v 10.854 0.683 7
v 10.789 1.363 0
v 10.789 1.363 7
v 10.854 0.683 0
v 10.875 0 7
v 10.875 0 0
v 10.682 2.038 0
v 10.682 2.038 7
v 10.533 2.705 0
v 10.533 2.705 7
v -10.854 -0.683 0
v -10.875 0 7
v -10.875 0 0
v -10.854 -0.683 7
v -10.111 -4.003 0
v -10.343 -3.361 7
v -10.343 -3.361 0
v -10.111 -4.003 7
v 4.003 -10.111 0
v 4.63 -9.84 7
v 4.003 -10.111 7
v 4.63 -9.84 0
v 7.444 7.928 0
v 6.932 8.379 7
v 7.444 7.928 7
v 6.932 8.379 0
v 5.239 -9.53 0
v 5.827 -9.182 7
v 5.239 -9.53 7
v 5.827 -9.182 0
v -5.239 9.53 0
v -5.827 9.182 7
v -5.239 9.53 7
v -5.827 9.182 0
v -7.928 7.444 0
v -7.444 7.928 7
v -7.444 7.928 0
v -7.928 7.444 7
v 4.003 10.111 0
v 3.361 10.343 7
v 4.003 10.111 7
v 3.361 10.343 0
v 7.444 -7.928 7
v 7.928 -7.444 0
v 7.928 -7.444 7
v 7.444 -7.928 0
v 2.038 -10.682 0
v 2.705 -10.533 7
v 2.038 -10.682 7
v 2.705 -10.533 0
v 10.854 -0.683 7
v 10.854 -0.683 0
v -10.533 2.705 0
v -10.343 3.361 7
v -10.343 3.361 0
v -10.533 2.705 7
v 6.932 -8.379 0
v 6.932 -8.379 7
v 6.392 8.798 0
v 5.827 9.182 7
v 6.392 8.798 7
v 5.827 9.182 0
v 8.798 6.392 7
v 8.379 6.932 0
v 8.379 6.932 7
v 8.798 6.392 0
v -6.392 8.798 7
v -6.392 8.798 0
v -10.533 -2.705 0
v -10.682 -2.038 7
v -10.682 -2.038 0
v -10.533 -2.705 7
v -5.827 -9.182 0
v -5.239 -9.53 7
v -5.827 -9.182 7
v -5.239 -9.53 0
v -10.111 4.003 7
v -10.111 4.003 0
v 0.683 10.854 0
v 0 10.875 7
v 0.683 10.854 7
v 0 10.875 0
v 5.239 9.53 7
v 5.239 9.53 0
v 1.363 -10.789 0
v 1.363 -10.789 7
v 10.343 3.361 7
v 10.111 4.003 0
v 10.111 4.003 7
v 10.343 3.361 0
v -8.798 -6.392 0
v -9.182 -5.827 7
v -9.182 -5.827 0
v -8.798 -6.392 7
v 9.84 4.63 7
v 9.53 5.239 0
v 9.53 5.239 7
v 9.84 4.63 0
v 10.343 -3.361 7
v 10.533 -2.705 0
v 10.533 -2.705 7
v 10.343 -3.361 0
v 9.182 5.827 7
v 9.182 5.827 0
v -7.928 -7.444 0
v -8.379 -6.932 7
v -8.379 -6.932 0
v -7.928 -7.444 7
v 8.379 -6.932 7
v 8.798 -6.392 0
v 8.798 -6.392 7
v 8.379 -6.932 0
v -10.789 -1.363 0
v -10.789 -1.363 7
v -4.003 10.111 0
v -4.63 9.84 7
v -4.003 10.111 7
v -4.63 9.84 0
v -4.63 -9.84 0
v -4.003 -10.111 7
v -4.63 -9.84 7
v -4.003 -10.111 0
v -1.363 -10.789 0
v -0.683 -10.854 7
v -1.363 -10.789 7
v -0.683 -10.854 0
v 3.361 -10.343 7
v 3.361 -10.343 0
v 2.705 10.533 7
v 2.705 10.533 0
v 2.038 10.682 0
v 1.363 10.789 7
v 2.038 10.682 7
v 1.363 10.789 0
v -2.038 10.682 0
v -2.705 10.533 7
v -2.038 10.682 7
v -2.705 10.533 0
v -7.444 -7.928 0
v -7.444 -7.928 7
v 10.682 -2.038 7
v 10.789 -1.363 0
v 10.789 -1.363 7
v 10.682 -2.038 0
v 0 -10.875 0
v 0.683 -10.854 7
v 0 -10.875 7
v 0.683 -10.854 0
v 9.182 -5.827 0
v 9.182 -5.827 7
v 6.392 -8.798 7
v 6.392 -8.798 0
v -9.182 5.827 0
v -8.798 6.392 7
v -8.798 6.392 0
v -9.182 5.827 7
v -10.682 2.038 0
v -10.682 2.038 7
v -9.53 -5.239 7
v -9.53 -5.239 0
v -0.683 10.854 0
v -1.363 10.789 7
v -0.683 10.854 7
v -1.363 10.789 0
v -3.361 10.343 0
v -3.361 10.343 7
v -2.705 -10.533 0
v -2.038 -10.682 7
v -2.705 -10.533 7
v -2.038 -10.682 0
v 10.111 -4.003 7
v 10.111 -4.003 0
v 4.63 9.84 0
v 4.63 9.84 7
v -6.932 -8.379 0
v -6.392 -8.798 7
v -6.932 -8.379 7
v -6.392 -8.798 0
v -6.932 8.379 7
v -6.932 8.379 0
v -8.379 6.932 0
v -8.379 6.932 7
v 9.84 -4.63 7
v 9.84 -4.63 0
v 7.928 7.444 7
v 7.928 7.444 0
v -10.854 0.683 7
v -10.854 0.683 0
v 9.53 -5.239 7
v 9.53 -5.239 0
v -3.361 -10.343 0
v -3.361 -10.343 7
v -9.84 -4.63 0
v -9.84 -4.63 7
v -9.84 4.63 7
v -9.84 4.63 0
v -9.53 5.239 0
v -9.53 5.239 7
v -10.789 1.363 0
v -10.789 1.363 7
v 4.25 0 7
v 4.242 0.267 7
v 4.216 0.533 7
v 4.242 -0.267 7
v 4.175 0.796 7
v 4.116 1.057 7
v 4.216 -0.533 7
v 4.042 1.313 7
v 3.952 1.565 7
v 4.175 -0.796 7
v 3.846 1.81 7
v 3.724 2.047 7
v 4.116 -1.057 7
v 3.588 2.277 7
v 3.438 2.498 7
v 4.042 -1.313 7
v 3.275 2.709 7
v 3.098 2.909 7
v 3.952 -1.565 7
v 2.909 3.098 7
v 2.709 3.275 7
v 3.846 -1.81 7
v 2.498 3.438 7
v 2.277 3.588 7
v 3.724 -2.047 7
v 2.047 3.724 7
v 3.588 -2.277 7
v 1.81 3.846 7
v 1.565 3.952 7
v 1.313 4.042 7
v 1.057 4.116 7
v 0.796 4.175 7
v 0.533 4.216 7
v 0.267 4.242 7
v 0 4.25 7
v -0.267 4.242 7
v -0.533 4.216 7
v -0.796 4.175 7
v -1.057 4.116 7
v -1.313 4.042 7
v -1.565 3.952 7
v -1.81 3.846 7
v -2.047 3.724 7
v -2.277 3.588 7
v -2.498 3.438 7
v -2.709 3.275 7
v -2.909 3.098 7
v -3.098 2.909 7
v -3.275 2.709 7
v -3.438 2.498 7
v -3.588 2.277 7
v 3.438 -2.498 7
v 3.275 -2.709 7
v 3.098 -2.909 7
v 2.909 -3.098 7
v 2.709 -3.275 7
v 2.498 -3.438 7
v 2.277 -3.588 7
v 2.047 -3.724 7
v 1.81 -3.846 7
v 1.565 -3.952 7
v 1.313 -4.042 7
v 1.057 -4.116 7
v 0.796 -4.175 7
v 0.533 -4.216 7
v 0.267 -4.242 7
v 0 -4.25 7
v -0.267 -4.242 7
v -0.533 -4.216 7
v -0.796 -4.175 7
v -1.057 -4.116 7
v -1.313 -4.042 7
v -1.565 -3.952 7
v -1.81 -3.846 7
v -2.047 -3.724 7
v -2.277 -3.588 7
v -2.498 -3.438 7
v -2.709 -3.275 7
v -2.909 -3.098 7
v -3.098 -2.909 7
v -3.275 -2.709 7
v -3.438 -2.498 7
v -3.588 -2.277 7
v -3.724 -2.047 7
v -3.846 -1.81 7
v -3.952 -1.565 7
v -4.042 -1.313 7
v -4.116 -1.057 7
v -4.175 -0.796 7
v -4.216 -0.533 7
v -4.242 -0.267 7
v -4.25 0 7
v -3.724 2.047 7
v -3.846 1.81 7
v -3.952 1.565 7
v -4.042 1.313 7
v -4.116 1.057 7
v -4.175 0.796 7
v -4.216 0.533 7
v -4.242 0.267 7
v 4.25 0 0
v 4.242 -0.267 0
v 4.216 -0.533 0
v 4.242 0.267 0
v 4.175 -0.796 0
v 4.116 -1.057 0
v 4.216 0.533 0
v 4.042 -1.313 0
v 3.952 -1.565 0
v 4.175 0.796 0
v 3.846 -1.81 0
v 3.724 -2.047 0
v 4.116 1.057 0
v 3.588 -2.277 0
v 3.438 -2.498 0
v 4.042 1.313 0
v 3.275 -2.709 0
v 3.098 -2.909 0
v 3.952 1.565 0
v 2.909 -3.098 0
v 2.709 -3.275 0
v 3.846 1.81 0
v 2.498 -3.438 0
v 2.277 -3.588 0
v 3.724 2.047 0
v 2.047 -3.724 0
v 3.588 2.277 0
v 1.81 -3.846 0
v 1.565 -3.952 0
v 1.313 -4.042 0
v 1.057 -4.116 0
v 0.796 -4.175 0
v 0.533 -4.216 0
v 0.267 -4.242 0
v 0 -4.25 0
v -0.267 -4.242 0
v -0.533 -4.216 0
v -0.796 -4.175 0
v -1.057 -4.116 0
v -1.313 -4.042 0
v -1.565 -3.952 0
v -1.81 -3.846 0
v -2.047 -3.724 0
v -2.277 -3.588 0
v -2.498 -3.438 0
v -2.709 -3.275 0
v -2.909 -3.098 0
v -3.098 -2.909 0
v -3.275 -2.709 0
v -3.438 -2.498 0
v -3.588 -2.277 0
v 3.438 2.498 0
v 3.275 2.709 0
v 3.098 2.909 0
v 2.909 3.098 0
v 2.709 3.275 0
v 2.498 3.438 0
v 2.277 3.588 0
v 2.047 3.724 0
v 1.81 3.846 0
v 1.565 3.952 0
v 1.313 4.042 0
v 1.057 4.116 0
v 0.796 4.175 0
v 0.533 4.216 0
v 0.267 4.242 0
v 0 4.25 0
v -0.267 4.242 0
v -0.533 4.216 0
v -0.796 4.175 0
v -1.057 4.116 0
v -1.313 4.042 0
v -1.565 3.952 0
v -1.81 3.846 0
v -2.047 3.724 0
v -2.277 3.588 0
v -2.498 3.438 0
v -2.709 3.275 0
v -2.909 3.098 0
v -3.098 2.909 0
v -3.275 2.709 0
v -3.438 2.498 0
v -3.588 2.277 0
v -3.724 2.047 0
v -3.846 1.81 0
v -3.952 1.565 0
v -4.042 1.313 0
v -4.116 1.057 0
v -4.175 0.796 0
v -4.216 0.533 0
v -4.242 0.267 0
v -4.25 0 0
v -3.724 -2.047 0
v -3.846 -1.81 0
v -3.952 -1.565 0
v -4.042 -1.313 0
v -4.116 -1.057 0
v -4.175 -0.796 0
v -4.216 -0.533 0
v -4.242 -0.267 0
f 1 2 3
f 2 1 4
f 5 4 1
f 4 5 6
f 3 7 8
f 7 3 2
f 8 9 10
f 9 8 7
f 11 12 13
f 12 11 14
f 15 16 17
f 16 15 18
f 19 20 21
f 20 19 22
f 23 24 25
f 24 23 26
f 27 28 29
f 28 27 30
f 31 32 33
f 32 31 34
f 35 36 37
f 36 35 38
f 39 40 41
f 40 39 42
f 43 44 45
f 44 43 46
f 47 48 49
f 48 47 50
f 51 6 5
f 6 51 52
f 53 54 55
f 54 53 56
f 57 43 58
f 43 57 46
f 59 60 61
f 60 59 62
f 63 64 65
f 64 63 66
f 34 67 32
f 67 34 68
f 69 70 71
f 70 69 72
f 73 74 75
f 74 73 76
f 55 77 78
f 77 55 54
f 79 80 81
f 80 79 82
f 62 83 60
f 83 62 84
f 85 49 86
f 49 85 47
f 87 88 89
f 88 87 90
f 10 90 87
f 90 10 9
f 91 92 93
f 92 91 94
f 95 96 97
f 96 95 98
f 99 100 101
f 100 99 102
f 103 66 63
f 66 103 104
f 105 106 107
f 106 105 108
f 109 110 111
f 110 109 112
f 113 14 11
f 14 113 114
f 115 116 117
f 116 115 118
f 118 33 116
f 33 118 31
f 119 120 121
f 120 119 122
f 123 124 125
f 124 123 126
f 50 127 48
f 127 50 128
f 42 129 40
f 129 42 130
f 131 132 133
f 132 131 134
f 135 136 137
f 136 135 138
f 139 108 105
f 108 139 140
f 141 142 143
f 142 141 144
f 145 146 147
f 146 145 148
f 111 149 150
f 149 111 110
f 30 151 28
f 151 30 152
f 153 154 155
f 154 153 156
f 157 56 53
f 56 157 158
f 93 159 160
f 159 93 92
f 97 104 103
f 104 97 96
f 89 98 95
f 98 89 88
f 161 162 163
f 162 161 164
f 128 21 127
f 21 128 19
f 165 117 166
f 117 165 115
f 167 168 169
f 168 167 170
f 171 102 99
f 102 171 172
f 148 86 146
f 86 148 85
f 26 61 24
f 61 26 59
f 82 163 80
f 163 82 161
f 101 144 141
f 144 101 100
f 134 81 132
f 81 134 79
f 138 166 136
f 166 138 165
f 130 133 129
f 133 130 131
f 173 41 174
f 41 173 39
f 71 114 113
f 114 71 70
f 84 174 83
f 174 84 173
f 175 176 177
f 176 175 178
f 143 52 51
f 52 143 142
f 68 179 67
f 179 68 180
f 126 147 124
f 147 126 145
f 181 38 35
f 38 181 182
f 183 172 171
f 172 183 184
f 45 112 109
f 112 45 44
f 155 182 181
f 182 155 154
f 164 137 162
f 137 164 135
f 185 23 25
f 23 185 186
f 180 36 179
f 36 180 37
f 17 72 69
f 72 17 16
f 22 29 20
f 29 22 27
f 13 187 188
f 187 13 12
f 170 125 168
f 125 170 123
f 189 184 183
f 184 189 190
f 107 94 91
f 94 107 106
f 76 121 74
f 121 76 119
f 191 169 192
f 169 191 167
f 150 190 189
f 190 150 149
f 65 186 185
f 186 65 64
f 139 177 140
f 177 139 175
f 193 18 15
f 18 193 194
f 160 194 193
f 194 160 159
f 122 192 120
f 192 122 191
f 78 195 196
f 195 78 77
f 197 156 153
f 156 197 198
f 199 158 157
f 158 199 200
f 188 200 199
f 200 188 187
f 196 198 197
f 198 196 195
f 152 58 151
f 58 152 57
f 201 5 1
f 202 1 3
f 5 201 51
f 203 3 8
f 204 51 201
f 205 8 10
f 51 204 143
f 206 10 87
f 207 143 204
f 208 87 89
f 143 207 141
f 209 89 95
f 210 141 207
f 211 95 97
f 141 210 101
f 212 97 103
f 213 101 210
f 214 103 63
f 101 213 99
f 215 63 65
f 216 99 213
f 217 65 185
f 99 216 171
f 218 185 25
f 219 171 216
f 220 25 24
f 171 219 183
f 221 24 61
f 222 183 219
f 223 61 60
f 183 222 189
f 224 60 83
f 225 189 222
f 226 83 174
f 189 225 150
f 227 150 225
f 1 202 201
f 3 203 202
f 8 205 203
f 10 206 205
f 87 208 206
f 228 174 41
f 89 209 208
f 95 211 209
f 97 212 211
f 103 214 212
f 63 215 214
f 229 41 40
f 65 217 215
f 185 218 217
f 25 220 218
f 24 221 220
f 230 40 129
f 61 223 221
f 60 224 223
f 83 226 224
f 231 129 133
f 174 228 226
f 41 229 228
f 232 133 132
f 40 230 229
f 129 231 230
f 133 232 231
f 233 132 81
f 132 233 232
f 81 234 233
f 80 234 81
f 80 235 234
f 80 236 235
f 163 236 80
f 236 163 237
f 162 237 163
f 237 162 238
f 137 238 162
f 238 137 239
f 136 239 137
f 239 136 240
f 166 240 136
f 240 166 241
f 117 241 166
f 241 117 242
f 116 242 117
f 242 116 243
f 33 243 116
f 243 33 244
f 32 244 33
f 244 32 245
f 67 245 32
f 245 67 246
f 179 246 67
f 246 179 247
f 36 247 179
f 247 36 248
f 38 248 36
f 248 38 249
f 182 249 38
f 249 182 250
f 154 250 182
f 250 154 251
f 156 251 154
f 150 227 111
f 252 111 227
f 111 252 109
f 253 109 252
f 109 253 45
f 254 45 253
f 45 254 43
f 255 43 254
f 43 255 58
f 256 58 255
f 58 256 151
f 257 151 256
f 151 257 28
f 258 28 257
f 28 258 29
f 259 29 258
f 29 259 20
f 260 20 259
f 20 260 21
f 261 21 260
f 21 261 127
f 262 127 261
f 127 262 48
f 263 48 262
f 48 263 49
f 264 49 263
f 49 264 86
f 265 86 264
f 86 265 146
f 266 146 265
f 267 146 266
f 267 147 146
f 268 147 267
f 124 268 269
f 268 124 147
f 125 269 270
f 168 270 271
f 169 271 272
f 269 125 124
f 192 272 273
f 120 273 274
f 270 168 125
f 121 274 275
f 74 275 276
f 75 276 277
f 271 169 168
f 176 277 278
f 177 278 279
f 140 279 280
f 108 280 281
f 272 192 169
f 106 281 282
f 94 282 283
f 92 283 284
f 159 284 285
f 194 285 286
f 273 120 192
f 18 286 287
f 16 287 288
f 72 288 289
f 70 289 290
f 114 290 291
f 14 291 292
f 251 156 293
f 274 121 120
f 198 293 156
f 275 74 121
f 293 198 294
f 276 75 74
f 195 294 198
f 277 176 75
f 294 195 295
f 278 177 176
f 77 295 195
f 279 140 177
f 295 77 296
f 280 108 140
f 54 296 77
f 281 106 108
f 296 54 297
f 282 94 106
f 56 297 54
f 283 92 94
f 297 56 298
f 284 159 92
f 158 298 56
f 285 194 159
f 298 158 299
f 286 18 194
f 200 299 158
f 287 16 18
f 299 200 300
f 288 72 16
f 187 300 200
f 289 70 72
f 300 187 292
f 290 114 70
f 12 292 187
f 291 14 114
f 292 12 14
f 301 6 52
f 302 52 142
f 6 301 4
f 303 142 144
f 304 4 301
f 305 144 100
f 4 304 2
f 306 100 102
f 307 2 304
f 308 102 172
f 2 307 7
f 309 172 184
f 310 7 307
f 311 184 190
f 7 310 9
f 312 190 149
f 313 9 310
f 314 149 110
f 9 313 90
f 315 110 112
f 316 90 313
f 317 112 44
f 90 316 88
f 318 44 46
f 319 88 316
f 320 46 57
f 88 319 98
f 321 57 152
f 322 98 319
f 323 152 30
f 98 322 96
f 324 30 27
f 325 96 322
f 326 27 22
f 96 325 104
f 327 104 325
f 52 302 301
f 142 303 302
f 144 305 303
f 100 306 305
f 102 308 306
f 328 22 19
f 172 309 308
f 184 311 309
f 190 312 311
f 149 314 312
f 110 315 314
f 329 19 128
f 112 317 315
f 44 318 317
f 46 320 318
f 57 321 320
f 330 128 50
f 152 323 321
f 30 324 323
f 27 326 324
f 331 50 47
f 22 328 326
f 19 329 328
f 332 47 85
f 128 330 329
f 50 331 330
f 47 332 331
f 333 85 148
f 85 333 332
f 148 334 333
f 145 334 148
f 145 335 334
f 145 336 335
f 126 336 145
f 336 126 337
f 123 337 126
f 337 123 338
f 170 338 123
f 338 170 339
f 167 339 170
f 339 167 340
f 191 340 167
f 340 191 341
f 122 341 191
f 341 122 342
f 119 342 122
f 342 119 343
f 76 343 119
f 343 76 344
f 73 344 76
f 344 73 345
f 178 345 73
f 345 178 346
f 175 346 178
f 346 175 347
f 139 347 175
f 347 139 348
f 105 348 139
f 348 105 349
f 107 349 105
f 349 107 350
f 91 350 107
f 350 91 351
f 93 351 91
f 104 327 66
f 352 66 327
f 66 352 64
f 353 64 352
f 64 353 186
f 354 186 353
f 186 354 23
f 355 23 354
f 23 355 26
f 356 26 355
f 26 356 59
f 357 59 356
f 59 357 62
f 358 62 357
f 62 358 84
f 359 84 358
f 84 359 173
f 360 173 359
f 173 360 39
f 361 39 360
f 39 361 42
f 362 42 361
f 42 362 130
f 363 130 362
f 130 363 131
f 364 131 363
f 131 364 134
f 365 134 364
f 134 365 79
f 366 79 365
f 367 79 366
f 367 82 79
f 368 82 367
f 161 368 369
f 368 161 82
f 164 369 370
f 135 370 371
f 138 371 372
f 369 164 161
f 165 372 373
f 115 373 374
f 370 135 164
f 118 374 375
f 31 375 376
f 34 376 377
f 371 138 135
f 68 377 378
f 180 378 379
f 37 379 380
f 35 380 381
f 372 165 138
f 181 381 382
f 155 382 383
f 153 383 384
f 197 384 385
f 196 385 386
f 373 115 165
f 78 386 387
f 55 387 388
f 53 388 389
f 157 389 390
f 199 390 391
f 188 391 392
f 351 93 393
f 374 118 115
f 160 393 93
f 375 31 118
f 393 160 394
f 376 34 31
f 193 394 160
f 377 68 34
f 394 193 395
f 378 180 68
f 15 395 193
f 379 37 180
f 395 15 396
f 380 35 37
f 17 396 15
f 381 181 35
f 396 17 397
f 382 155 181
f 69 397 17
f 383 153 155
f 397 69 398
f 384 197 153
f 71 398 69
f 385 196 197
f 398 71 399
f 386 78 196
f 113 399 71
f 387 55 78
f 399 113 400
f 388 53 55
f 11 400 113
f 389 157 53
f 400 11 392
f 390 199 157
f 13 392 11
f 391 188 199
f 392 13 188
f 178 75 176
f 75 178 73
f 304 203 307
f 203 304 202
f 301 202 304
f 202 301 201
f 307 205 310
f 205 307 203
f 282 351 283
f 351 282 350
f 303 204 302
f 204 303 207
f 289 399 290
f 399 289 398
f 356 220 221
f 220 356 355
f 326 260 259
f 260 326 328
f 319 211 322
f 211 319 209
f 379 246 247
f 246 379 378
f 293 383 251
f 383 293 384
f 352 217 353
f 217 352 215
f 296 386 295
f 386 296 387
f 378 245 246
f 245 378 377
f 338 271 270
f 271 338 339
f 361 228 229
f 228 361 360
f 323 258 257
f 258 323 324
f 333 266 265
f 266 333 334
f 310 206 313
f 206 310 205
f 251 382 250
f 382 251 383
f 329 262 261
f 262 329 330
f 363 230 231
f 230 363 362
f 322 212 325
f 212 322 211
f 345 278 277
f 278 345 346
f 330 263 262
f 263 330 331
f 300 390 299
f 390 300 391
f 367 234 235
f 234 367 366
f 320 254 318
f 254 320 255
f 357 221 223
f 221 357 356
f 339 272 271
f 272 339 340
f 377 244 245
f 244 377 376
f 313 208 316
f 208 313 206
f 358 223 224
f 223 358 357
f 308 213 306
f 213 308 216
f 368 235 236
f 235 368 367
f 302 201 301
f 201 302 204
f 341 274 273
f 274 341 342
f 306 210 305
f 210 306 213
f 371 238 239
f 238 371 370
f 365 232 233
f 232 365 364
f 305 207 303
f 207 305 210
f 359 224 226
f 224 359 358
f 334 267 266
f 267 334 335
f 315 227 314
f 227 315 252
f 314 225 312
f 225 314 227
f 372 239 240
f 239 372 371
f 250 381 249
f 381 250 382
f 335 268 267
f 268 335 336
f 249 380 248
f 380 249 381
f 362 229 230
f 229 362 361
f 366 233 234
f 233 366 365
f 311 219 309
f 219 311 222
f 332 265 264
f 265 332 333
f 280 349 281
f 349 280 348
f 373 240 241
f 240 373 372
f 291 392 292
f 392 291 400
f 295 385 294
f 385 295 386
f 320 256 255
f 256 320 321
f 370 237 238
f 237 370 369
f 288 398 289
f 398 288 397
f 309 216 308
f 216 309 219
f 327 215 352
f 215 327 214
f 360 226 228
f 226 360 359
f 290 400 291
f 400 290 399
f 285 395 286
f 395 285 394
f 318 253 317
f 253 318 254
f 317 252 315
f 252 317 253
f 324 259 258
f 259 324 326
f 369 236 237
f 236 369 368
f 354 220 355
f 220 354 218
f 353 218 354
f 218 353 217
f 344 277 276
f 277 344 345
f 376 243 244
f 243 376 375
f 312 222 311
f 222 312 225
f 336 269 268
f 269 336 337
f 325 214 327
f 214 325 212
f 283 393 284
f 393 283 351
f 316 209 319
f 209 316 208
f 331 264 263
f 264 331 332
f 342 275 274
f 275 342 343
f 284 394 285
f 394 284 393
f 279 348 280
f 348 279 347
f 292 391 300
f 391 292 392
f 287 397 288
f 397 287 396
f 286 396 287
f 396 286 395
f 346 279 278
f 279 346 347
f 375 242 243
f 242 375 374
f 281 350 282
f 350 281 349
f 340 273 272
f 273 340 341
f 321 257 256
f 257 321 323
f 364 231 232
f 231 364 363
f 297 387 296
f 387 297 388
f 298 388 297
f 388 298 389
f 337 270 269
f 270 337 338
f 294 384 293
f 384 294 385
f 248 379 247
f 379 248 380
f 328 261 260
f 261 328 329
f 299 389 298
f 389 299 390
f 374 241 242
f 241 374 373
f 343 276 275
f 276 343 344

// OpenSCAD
// Bearing Customiser (http://www.thingiverse.com/thing:313437)
// *********************************************************************************
// Version history:
// Author:			Date: 			Description:
// Whitecoat		2014-04-28		Initial build
// 
// *********************************************************************************
// customiser script

// Bearing Part Number
PartNo = 608;  // [ 603,  604, 605,606, 607, 608, 609, 623, 624, 625, 626, 627, 628, 629, 633, 634, 635, 636, 637, 638, 639, 673, 674, 675, 676, 677,  678,  683,  684,  685,  686,  687,  688,  689,  693,  694,  695,  696,  697,  698,  699,  6000, 6001, 6002, 6003, 6004, 6005, 6006, 6007, 6008, 6009, 6010, 6011, 6012, 6013, 6014, 6015, 6016, 6017, 6018, 6019, 6020, 6021, 6022, 6024, 6026, 6028, 6030, 6200, 6201, 6202, 6203, 6204, 6205, 6206, 6207, 6208, 6209, 6210, 6211, 6212, 6213, 6214, 6215, 6216, 6217, 6218, 6219, 6220, 6221, 6222, 6224, 6226, 6228, 6230, 6300, 6301, 6302, 6303, 6304, 6305, 6306, 6307, 6308, 6309, 6310, 6311, 6312, 6313, 6314, 6315, 6316, 6317, 6318, 6319, 6320, 6321, 6322, 6324, 6326, 6328, 6330, 6701, 6702, 6703, 6704, 6705, 6706, 6707, 6800, 6801, 6802, 6803, 6804, 6805, 6806, 6807, 6808, 6809, 6810, 6811, 6812, 6813, 6814, 6815, 6816, 6817, 6818, 6819, 6820, 6821, 6822, 6824, 6826, 6828, 6830, 6200, 6201, 6202, 6203, 6204, 6205, 6206, 6207, 6208, 6209, 6210, 6211, 6212, 6213, 6214, 6215, 6216, 6217, 6218, 6219, 6220, 6221, 6222, 6224, 6226, 6228, 6230, 6300, 6301, 6302, 6303, 6304, 6305, 6306, 6307, 6308, 6309, 6310, 6311, 6312, 6313, 6314, 6315, 6316, 6317, 6318, 6319, 6320, 6321, 6322, 6324, 6326, 6328, 6330, 6701, 6702, 6703, 6704,  6705, 6706, 6707, 6800, 6801, 6802, 6803, 6804, 6805, 6806, 6807, 6808, 6809, 6810, 6811, 6812, 6813, 6814, 6815, 6816, 6817, 6818, 6819, 6820, 6821, 6822, 6824, 6826, 6828, 6830, 6900, 6901, 6902, 6903, 6904, 6905, 6906, 6907, 6908, 6909, 6910, 6911, 6912, 6913, 6914, 6915, 6916, 6917, 6918, 6919, 6920, 6921, 6922, 6924, 6926, 6928, 6930, 16001, 16002, 16003, 16004, 16005, 16006, 16007, 16008, 16009, 16010, 16011, 16012, 16013, 16014, 16015, 16016, 16017, 16018, 16019, 16020, 16021, 16022 ]
 

// Printer Tolerance (in mm).  This makes the print just a bit smaller to account for inaccuracy in printing. 
PrintTolerance = 0.25; 

fake_bearing(BearingPartNoToDim(PartNo),PrintTolerance);


// *********************************************************************************
//  Pasted in a bearing library below this point so that there was a single script 
//  for the customiser app
// *********************************************************************************


// Bearing Library
// *********************************************************************************
// Version history:
// Author:			Date: 			Description:
// Whitecoat		2014-02-21		Initial build
// 
// *********************************************************************************
// Included Functions:
// [d, D, B] = BearingPartNoToDim(PartNo);  	//Returns Dimensions given Part Number
//
// *********************************************************************************
// Public Modules:
// fake_bearing([d, D, B],Tolerance);  	 	//Creates Bearing shape for given dimensions
//															// or: fake_bearing(BearingPartNoToDim(608));
// 
// BearingHole(p_bearing_size,p_tolerance)
// *********************************************************************************
// *********************************************************************************
// Included Internal Modules:
//	FakeBearingTest1();  			//Unit Test 1 - Fake Bearing

module FakeBearingTest1()
	{
	Tolerance = 1.0; 		
	fake_bearing([9,12,2],Tolerance);
	}




// build a fake bearing using size vector [d (Inner Diamater), D (Outer Diamater), B (Width)]
// ----------------------------------------------------------------
// This module just creates a cored cylinder in the same of a bearing.
module fake_bearing(p_bearing_size,p_tolerance=0.25)
	{
	// internal parameters
	l_diff_tol = 0.1;  	// a tollerance added to difference operations 
							 	// to ensure surface is subtracted

	// build
	difference()
		{
		cylinder(r=(p_bearing_size[1]-p_tolerance)/2,h=p_bearing_size[2],$fn=100);
		translate([0,0,-l_diff_tol])
			{
			cylinder(r=(p_bearing_size[0])/2+p_tolerance,h=p_bearing_size[2]+l_diff_tol*2,$fn=100);
			}
		}
	}

// BearingHole [d (Inner Diamater), D (Outer Diamater), B (Width)]
// ----------------------------------------------------------------
// This module is intended for subtraction in a difference to make a hole for a bearing
module BearingHole(p_bearing_size,p_tolerance=0.25)
	{
	// internal parameters
	l_diff_tol = 0.1;  	// a tollerance added to difference operations 
							 	// to ensure surface is subtracted

	// build
	difference()
		{
		cylinder(r=(p_bearing_size[1]+p_tolerance)/2,h=p_bearing_size[2],$fn=100);
		}
	}

// bearing PartNo to Dimension conversion - result [d, D, B] in mm
// ----------------------------------------------------------------
// I did find something like this in the generic bearing library with MCAD, but 
// it had a farily limited set of part numbers, I wanted a more complete 
// table for this purpose, so I wrote my own.
function BearingPartNoToDim(PartNo) =
// 600 series (ZZ)
	PartNo == 603 ? [3, 9,  5]:
	PartNo == 604 ? [4, 12, 4]:
	PartNo == 605 ? [5, 14, 5]:
	PartNo == 606 ? [6, 17, 6]:
	PartNo == 607 ? [7, 19, 6]:
	PartNo == 608 ? [8, 22, 7]:
	PartNo == 609 ? [9, 24, 7]:
	PartNo == 623 ? [3, 10, 4]:
	PartNo == 624 ? [4, 13, 5]:
	PartNo == 625 ? [5, 16, 5]:
	PartNo == 626 ? [6, 19, 6]:
	PartNo == 627 ? [7, 22, 7]:
	PartNo == 628 ? [8, 22, 7]:
	PartNo == 629 ? [9, 22, 7]:
	PartNo == 633 ? [3, 13, 5]:
	PartNo == 634 ? [4, 16, 5]:
	PartNo == 635 ? [5, 19, 6]:
	PartNo == 636 ? [6, 22, 7]:
	PartNo == 637 ? [7, 26, 9]:
	PartNo == 638 ? [8, 28, 9]:
	PartNo == 639 ? [9, 30, 10]:
	PartNo == 673 ? [3, 6, 2.5]:
	PartNo == 674 ? [4, 7, 2.5]:
	PartNo == 675 ? [5, 8, 2.5]:
	PartNo == 676 ? [6, 10, 3]:
	PartNo == 677 ? [7, 11, 3]:
	PartNo == 678 ? [8, 12, 3.5]:
	PartNo == 683 ? [3, 7, 3]:
	PartNo == 684 ? [4, 9, 4]:
	PartNo == 685 ? [5, 11, 5]:
	PartNo == 686 ? [6, 13, 5]:
	PartNo == 687 ? [7, 14, 5]:
	PartNo == 688 ? [8, 16, 5]:
	PartNo == 689 ? [9, 17, 5]:
	PartNo == 693 ? [3, 8, 4]:
	PartNo == 694 ? [4, 11, 4]:
	PartNo == 695 ? [5, 13, 4]:
	PartNo == 696 ? [6, 15, 5]:
	PartNo == 697 ? [7, 17, 5]:
	PartNo == 698 ? [8, 19, 6]:
	PartNo == 699 ? [9, 20, 6]:
	PartNo == 6000 ? [10,  26,  8]:
	PartNo == 6001 ? [12,  28,  8]:
	PartNo == 6002 ? [15,  32,  9]:
	PartNo == 6003 ? [17,  35,  10]:
	PartNo == 6004 ? [20,  42,  12]:
	PartNo == 6005 ? [25,  47,  12]:
	PartNo == 6006 ? [30,  55,  13]:
	PartNo == 6007 ? [35,  62,  14]:
	PartNo == 6008 ? [40,  68,  15]:
	PartNo == 6009 ? [45,  75,  16]:
	PartNo == 6010 ? [50,  80,  16]:
	PartNo == 6011 ? [55,  90,  18]:
	PartNo == 6012 ? [60,  95,  18]:
	PartNo == 6013 ? [65,  100,  18]:
	PartNo == 6014 ? [70,  110,  20]:
	PartNo == 6015 ? [75,  115,  20]:
	PartNo == 6016 ? [80,  125,  22]:
	PartNo == 6017 ? [85,  130,  22]:
	PartNo == 6018 ? [90,  140,  24]:
	PartNo == 6019 ? [95,  145,  24]:
	PartNo == 6020 ? [100,  150,  24]:
	PartNo == 6021 ? [105,  160,  26]:
	PartNo == 6022 ? [110,  170,  28]:
	PartNo == 6024 ? [120,  180,  28]:
	PartNo == 6026 ? [130,  200,  33]:
	PartNo == 6028 ? [140,  210,  33]:
	PartNo == 6030 ? [150,  225,  35]:
	PartNo == 6200 ? [10,  30,  9]:
	PartNo == 6201 ? [12,  32,  10]:
	PartNo == 6202 ? [15,  35,  11]:
	PartNo == 6203 ? [17,  40,  12]:
	PartNo == 6204 ? [20,  47,  14]:
	PartNo == 6205 ? [25,  52,  15]:
	PartNo == 6206 ? [30,  62,  16]:
	PartNo == 6207 ? [35,  72,  17]:
	PartNo == 6208 ? [40,  80,  18]:
	PartNo == 6209 ? [45,  85,  19]:
	PartNo == 6210 ? [50,  90,  20]:
	PartNo == 6211 ? [55,  100,  21]:
	PartNo == 6212 ? [60,  110,  22]:
	PartNo == 6213 ? [65,  120,  23]:
	PartNo == 6214 ? [70,  125,  24]:
	PartNo == 6215 ? [75,  130,  25]:
	PartNo == 6216 ? [80,  140,  26]:
	PartNo == 6217 ? [85,  150,  28]:
	PartNo == 6218 ? [90,  160,  30]:
	PartNo == 6219 ? [95,  170,  32]:
	PartNo == 6220 ? [100,  180,  34]:
	PartNo == 6221 ? [105,  190,  36]:
	PartNo == 6222 ? [110,  200,  38]:
	PartNo == 6224 ? [120,  215,  40]:
	PartNo == 6226 ? [130,  230,  40]:
	PartNo == 6228 ? [140,  250,  42]:
	PartNo == 6230 ? [150,  270,  45]:
	PartNo == 6300 ? [10,  35,  11]:
	PartNo == 6301 ? [12,  37,  12]:
	PartNo == 6302 ? [15,  42,  13]:
	PartNo == 6303 ? [17,  47,  14]:
	PartNo == 6304 ? [20,  52,  15]:
	PartNo == 6305 ? [25,  62,  17]:
	PartNo == 6306 ? [30,  72,  19]:
	PartNo == 6307 ? [35,  80,  21]:
	PartNo == 6308 ? [40,  90,  23]:
	PartNo == 6309 ? [45,  100,  25]:
	PartNo == 6310 ? [50,  110,  27]:
	PartNo == 6311 ? [55,  120,  29]:
	PartNo == 6312 ? [60,  130,  31]:
	PartNo == 6313 ? [65,  140,  33]:
	PartNo == 6314 ? [70,  150,  35]:
	PartNo == 6315 ? [75,  160,  37]:
	PartNo == 6316 ? [80,  170,  39]:
	PartNo == 6317 ? [85,  180,  41]:
	PartNo == 6318 ? [90,  190,  43]:
	PartNo == 6319 ? [95,  200,  45]:
	PartNo == 6320 ? [100,  215,  47]:
	PartNo == 6321 ? [105,  225,  49]:
	PartNo == 6322 ? [110,  240,  50]:
	PartNo == 6324 ? [120,  260,  55]:
	PartNo == 6326 ? [130,  280,  58]:
	PartNo == 6328 ? [140,  300,  62]:
	PartNo == 6330 ? [150,  320,  65]:
	PartNo == 6701 ? [12,  18,  4]:
	PartNo == 6702 ? [15,  21,  4]:
	PartNo == 6703 ? [17,  23,  4]:
	PartNo == 6704 ? [20,  27,  4]:
	PartNo == 6705 ? [25,  32,  4]:
	PartNo == 6706 ? [30,  37,  4]:
	PartNo == 6707 ? [35,  44,  5]:
	PartNo == 6800 ? [10,  19,  5]:
	PartNo == 6801 ? [12,  21,  5]:
	PartNo == 6802 ? [15,  24,  5]:
	PartNo == 6803 ? [17,  26,  5]:
	PartNo == 6804 ? [20,  32,  7]:
	PartNo == 6805 ? [25,  37,  7]:
	PartNo == 6806 ? [30,  42,  7]:
	PartNo == 6807 ? [35,  47,  7]:
	PartNo == 6808 ? [40,  52,  7]:
	PartNo == 6809 ? [45,  58,  7]:
	PartNo == 6810 ? [50,  65,  7]:
	PartNo == 6811 ? [55,  72,  9]:
	PartNo == 6812 ? [60,  78,  10]:
	PartNo == 6813 ? [65,  85,  10]:
	PartNo == 6814 ? [70,  90,  10]:
	PartNo == 6815 ? [75,  95,  10]:
	PartNo == 6816 ? [80,  100,  10]:
	PartNo == 6817 ? [85,  110,  13]:
	PartNo == 6818 ? [90,  115,  13]:
	PartNo == 6819 ? [95,  120,  13]:
	PartNo == 6820 ? [100,  125,  13]:
	PartNo == 6821 ? [105,  130,  13]:
	PartNo == 6822 ? [110,  140,  16]:
	PartNo == 6824 ? [120,  150,  16]:
	PartNo == 6826 ? [130,  165,  18]:
	PartNo == 6828 ? [140,  175,  18]:
	PartNo == 6830 ? [150,  190,  20]:
	PartNo == 6200 ? [10,  30,  9]:
	PartNo == 6201 ? [12,  32,  10]:
	PartNo == 6202 ? [15,  35,  11]:
	PartNo == 6203 ? [17,  40,  12]:
	PartNo == 6204 ? [20,  47,  14]:
	PartNo == 6205 ? [25,  52,  15]:
	PartNo == 6206 ? [30,  62,  16]:
	PartNo == 6207 ? [35,  72,  17]:
	PartNo == 6208 ? [40,  80,  18]:
	PartNo == 6209 ? [45,  85,  19]:
	PartNo == 6210 ? [50,  90,  20]:
	PartNo == 6211 ? [55,  100,  21]:
	PartNo == 6212 ? [60,  110,  22]:
	PartNo == 6213 ? [65,  120,  23]:
	PartNo == 6214 ? [70,  125,  24]:
	PartNo == 6215 ? [75,  130,  25]:
	PartNo == 6216 ? [80,  140,  26]:
	PartNo == 6217 ? [85,  150,  28]:
	PartNo == 6218 ? [90,  160,  30]:
	PartNo == 6219 ? [95,  170,  32]:
	PartNo == 6220 ? [100,  180,  34]:
	PartNo == 6221 ? [105,  190,  36]:
	PartNo == 6222 ? [110,  200,  38]:
	PartNo == 6224 ? [120,  215,  40]:
	PartNo == 6226 ? [130,  230,  40]:
	PartNo == 6228 ? [140,  250,  42]:
	PartNo == 6230 ? [150,  270,  45]:
	PartNo == 6300 ? [10,  35,  11]:
	PartNo == 6301 ? [12,  37,  12]:
	PartNo == 6302 ? [15,  42,  13]:
	PartNo == 6303 ? [17,  47,  14]:
	PartNo == 6304 ? [20,  52,  15]:
	PartNo == 6305 ? [25,  62,  17]:
	PartNo == 6306 ? [30,  72,  19]:
	PartNo == 6307 ? [35,  80,  21]:
	PartNo == 6308 ? [40,  90,  23]:
	PartNo == 6309 ? [45,  100,  25]:
	PartNo == 6310 ? [50,  110,  27]:
	PartNo == 6311 ? [55,  120,  29]:
	PartNo == 6312 ? [60,  130,  31]:
	PartNo == 6313 ? [65,  140,  33]:
	PartNo == 6314 ? [70,  150,  35]:
	PartNo == 6315 ? [75,  160,  37]:
	PartNo == 6316 ? [80,  170,  39]:
	PartNo == 6317 ? [85,  180,  41]:
	PartNo == 6318 ? [90,  190,  43]:
	PartNo == 6319 ? [95,  200,  45]:
	PartNo == 6320 ? [100,  215,  47]:
	PartNo == 6321 ? [105,  225,  49]:
	PartNo == 6322 ? [110,  240,  50]:
	PartNo == 6324 ? [120,  260,  55]:
	PartNo == 6326 ? [130,  280,  58]:
	PartNo == 6328 ? [140,  300,  62]:
	PartNo == 6330 ? [150,  320,  65]:
	PartNo == 6701 ? [12,  18,  4]:
	PartNo == 6702 ? [15,  21,  4]:
	PartNo == 6703 ? [17,  23,  4]:
	PartNo == 6704 ? [20,  27,  4]:
	PartNo == 6705 ? [25,  32,  4]:
	PartNo == 6706 ? [30,  37,  4]:
	PartNo == 6707 ? [35,  44,  5]:
	PartNo == 6800 ? [10,  19,  5]:
	PartNo == 6801 ? [12,  21,  5]:
	PartNo == 6802 ? [15,  24,  5]:
	PartNo == 6803 ? [17,  26,  5]:
	PartNo == 6804 ? [20,  32,  7]:
	PartNo == 6805 ? [25,  37,  7]:
	PartNo == 6806 ? [30,  42,  7]:
	PartNo == 6807 ? [35,  47,  7]:
	PartNo == 6808 ? [40,  52,  7]:
	PartNo == 6809 ? [45,  58,  7]:
	PartNo == 6810 ? [50,  65,  7]:
	PartNo == 6811 ? [55,  72,  9]:
	PartNo == 6812 ? [60,  78,  10]:
	PartNo == 6813 ? [65,  85,  10]:
	PartNo == 6814 ? [70,  90,  10]:
	PartNo == 6815 ? [75,  95,  10]:
	PartNo == 6816 ? [80,  100,  10]:
	PartNo == 6817 ? [85,  110,  13]:
	PartNo == 6818 ? [90,  115,  13]:
	PartNo == 6819 ? [95,  120,  13]:
	PartNo == 6820 ? [100,  125,  13]:
	PartNo == 6821 ? [105,  130,  13]:
	PartNo == 6822 ? [110,  140,  16]:
	PartNo == 6824 ? [120,  150,  16]:
	PartNo == 6826 ? [130,  165,  18]:
	PartNo == 6828 ? [140,  175,  18]:
	PartNo == 6830 ? [150,  190,  20]:
	PartNo == 6900 ? [10,  22,  6]:
	PartNo == 6901 ? [12,  24,  6]:
	PartNo == 6902 ? [15,  28,  7]:
	PartNo == 6903 ? [17,  30,  7]:
	PartNo == 6904 ? [20,  37,  9]:
	PartNo == 6905 ? [25,  42,  9]:
	PartNo == 6906 ? [30,  47,  9]:
	PartNo == 6907 ? [35,  55,  10]:
	PartNo == 6908 ? [40,  62,  12]:
	PartNo == 6909 ? [45,  68,  12]:
	PartNo == 6910 ? [50,  72,  12]:
	PartNo == 6911 ? [55,  80,  13]:
	PartNo == 6912 ? [60,  85,  13]:
	PartNo == 6913 ? [65,  90,  13]:
	PartNo == 6914 ? [70,  100,  16]:
	PartNo == 6915 ? [75,  105,  16]:
	PartNo == 6916 ? [80,  110,  16]:
	PartNo == 6917 ? [85,  120,  18]:
	PartNo == 6918 ? [90,  125,  18]:
	PartNo == 6919 ? [95,  130,  18]:
	PartNo == 6920 ? [100,  140,  20]:
	PartNo == 6921 ? [105,  145,  20]:
	PartNo == 6922 ? [110,  150,  20]:
	PartNo == 6924 ? [120,  165,  22]:
	PartNo == 6926 ? [130,  180,  24]:
	PartNo == 6928 ? [140,  190,  24]:
	PartNo == 6930 ? [150,  210,  28]:
	PartNo == 16001 ? [12,  28,  7]:
	PartNo == 16002 ? [15,  32,  8]:
	PartNo == 16003 ? [17,  35,  8]:
	PartNo == 16004 ? [20,  42,  8]:
	PartNo == 16005 ? [25,  47,  8]:
	PartNo == 16006 ? [30,  55,  9]:
	PartNo == 16007 ? [35,  62,  9]:
	PartNo == 16008 ? [40,  68,  9]:
	PartNo == 16009 ? [45,  75,  10]:
	PartNo == 16010 ? [50,  80,  10]:
	PartNo == 16011 ? [55,  90,  11]:
	PartNo == 16012 ? [60,  95,  11]:
	PartNo == 16013 ? [65,  100,  11]:
	PartNo == 16014 ? [70,  110,  13]:
	PartNo == 16015 ? [75,  115,  13]:
	PartNo == 16016 ? [80,  125,  14]:
	PartNo == 16017 ? [85,  130,  14]:
	PartNo == 16018 ? [90,  140,  16]:
	PartNo == 16019 ? [95,  145,  16]:
	PartNo == 16020 ? [100,  150,  16]:
	PartNo == 16021 ? [105,  160,  18]:
	PartNo == 16022 ? [110,  170,  19]:
	// default
   BearingPartNoToDim(608); // default to 608
